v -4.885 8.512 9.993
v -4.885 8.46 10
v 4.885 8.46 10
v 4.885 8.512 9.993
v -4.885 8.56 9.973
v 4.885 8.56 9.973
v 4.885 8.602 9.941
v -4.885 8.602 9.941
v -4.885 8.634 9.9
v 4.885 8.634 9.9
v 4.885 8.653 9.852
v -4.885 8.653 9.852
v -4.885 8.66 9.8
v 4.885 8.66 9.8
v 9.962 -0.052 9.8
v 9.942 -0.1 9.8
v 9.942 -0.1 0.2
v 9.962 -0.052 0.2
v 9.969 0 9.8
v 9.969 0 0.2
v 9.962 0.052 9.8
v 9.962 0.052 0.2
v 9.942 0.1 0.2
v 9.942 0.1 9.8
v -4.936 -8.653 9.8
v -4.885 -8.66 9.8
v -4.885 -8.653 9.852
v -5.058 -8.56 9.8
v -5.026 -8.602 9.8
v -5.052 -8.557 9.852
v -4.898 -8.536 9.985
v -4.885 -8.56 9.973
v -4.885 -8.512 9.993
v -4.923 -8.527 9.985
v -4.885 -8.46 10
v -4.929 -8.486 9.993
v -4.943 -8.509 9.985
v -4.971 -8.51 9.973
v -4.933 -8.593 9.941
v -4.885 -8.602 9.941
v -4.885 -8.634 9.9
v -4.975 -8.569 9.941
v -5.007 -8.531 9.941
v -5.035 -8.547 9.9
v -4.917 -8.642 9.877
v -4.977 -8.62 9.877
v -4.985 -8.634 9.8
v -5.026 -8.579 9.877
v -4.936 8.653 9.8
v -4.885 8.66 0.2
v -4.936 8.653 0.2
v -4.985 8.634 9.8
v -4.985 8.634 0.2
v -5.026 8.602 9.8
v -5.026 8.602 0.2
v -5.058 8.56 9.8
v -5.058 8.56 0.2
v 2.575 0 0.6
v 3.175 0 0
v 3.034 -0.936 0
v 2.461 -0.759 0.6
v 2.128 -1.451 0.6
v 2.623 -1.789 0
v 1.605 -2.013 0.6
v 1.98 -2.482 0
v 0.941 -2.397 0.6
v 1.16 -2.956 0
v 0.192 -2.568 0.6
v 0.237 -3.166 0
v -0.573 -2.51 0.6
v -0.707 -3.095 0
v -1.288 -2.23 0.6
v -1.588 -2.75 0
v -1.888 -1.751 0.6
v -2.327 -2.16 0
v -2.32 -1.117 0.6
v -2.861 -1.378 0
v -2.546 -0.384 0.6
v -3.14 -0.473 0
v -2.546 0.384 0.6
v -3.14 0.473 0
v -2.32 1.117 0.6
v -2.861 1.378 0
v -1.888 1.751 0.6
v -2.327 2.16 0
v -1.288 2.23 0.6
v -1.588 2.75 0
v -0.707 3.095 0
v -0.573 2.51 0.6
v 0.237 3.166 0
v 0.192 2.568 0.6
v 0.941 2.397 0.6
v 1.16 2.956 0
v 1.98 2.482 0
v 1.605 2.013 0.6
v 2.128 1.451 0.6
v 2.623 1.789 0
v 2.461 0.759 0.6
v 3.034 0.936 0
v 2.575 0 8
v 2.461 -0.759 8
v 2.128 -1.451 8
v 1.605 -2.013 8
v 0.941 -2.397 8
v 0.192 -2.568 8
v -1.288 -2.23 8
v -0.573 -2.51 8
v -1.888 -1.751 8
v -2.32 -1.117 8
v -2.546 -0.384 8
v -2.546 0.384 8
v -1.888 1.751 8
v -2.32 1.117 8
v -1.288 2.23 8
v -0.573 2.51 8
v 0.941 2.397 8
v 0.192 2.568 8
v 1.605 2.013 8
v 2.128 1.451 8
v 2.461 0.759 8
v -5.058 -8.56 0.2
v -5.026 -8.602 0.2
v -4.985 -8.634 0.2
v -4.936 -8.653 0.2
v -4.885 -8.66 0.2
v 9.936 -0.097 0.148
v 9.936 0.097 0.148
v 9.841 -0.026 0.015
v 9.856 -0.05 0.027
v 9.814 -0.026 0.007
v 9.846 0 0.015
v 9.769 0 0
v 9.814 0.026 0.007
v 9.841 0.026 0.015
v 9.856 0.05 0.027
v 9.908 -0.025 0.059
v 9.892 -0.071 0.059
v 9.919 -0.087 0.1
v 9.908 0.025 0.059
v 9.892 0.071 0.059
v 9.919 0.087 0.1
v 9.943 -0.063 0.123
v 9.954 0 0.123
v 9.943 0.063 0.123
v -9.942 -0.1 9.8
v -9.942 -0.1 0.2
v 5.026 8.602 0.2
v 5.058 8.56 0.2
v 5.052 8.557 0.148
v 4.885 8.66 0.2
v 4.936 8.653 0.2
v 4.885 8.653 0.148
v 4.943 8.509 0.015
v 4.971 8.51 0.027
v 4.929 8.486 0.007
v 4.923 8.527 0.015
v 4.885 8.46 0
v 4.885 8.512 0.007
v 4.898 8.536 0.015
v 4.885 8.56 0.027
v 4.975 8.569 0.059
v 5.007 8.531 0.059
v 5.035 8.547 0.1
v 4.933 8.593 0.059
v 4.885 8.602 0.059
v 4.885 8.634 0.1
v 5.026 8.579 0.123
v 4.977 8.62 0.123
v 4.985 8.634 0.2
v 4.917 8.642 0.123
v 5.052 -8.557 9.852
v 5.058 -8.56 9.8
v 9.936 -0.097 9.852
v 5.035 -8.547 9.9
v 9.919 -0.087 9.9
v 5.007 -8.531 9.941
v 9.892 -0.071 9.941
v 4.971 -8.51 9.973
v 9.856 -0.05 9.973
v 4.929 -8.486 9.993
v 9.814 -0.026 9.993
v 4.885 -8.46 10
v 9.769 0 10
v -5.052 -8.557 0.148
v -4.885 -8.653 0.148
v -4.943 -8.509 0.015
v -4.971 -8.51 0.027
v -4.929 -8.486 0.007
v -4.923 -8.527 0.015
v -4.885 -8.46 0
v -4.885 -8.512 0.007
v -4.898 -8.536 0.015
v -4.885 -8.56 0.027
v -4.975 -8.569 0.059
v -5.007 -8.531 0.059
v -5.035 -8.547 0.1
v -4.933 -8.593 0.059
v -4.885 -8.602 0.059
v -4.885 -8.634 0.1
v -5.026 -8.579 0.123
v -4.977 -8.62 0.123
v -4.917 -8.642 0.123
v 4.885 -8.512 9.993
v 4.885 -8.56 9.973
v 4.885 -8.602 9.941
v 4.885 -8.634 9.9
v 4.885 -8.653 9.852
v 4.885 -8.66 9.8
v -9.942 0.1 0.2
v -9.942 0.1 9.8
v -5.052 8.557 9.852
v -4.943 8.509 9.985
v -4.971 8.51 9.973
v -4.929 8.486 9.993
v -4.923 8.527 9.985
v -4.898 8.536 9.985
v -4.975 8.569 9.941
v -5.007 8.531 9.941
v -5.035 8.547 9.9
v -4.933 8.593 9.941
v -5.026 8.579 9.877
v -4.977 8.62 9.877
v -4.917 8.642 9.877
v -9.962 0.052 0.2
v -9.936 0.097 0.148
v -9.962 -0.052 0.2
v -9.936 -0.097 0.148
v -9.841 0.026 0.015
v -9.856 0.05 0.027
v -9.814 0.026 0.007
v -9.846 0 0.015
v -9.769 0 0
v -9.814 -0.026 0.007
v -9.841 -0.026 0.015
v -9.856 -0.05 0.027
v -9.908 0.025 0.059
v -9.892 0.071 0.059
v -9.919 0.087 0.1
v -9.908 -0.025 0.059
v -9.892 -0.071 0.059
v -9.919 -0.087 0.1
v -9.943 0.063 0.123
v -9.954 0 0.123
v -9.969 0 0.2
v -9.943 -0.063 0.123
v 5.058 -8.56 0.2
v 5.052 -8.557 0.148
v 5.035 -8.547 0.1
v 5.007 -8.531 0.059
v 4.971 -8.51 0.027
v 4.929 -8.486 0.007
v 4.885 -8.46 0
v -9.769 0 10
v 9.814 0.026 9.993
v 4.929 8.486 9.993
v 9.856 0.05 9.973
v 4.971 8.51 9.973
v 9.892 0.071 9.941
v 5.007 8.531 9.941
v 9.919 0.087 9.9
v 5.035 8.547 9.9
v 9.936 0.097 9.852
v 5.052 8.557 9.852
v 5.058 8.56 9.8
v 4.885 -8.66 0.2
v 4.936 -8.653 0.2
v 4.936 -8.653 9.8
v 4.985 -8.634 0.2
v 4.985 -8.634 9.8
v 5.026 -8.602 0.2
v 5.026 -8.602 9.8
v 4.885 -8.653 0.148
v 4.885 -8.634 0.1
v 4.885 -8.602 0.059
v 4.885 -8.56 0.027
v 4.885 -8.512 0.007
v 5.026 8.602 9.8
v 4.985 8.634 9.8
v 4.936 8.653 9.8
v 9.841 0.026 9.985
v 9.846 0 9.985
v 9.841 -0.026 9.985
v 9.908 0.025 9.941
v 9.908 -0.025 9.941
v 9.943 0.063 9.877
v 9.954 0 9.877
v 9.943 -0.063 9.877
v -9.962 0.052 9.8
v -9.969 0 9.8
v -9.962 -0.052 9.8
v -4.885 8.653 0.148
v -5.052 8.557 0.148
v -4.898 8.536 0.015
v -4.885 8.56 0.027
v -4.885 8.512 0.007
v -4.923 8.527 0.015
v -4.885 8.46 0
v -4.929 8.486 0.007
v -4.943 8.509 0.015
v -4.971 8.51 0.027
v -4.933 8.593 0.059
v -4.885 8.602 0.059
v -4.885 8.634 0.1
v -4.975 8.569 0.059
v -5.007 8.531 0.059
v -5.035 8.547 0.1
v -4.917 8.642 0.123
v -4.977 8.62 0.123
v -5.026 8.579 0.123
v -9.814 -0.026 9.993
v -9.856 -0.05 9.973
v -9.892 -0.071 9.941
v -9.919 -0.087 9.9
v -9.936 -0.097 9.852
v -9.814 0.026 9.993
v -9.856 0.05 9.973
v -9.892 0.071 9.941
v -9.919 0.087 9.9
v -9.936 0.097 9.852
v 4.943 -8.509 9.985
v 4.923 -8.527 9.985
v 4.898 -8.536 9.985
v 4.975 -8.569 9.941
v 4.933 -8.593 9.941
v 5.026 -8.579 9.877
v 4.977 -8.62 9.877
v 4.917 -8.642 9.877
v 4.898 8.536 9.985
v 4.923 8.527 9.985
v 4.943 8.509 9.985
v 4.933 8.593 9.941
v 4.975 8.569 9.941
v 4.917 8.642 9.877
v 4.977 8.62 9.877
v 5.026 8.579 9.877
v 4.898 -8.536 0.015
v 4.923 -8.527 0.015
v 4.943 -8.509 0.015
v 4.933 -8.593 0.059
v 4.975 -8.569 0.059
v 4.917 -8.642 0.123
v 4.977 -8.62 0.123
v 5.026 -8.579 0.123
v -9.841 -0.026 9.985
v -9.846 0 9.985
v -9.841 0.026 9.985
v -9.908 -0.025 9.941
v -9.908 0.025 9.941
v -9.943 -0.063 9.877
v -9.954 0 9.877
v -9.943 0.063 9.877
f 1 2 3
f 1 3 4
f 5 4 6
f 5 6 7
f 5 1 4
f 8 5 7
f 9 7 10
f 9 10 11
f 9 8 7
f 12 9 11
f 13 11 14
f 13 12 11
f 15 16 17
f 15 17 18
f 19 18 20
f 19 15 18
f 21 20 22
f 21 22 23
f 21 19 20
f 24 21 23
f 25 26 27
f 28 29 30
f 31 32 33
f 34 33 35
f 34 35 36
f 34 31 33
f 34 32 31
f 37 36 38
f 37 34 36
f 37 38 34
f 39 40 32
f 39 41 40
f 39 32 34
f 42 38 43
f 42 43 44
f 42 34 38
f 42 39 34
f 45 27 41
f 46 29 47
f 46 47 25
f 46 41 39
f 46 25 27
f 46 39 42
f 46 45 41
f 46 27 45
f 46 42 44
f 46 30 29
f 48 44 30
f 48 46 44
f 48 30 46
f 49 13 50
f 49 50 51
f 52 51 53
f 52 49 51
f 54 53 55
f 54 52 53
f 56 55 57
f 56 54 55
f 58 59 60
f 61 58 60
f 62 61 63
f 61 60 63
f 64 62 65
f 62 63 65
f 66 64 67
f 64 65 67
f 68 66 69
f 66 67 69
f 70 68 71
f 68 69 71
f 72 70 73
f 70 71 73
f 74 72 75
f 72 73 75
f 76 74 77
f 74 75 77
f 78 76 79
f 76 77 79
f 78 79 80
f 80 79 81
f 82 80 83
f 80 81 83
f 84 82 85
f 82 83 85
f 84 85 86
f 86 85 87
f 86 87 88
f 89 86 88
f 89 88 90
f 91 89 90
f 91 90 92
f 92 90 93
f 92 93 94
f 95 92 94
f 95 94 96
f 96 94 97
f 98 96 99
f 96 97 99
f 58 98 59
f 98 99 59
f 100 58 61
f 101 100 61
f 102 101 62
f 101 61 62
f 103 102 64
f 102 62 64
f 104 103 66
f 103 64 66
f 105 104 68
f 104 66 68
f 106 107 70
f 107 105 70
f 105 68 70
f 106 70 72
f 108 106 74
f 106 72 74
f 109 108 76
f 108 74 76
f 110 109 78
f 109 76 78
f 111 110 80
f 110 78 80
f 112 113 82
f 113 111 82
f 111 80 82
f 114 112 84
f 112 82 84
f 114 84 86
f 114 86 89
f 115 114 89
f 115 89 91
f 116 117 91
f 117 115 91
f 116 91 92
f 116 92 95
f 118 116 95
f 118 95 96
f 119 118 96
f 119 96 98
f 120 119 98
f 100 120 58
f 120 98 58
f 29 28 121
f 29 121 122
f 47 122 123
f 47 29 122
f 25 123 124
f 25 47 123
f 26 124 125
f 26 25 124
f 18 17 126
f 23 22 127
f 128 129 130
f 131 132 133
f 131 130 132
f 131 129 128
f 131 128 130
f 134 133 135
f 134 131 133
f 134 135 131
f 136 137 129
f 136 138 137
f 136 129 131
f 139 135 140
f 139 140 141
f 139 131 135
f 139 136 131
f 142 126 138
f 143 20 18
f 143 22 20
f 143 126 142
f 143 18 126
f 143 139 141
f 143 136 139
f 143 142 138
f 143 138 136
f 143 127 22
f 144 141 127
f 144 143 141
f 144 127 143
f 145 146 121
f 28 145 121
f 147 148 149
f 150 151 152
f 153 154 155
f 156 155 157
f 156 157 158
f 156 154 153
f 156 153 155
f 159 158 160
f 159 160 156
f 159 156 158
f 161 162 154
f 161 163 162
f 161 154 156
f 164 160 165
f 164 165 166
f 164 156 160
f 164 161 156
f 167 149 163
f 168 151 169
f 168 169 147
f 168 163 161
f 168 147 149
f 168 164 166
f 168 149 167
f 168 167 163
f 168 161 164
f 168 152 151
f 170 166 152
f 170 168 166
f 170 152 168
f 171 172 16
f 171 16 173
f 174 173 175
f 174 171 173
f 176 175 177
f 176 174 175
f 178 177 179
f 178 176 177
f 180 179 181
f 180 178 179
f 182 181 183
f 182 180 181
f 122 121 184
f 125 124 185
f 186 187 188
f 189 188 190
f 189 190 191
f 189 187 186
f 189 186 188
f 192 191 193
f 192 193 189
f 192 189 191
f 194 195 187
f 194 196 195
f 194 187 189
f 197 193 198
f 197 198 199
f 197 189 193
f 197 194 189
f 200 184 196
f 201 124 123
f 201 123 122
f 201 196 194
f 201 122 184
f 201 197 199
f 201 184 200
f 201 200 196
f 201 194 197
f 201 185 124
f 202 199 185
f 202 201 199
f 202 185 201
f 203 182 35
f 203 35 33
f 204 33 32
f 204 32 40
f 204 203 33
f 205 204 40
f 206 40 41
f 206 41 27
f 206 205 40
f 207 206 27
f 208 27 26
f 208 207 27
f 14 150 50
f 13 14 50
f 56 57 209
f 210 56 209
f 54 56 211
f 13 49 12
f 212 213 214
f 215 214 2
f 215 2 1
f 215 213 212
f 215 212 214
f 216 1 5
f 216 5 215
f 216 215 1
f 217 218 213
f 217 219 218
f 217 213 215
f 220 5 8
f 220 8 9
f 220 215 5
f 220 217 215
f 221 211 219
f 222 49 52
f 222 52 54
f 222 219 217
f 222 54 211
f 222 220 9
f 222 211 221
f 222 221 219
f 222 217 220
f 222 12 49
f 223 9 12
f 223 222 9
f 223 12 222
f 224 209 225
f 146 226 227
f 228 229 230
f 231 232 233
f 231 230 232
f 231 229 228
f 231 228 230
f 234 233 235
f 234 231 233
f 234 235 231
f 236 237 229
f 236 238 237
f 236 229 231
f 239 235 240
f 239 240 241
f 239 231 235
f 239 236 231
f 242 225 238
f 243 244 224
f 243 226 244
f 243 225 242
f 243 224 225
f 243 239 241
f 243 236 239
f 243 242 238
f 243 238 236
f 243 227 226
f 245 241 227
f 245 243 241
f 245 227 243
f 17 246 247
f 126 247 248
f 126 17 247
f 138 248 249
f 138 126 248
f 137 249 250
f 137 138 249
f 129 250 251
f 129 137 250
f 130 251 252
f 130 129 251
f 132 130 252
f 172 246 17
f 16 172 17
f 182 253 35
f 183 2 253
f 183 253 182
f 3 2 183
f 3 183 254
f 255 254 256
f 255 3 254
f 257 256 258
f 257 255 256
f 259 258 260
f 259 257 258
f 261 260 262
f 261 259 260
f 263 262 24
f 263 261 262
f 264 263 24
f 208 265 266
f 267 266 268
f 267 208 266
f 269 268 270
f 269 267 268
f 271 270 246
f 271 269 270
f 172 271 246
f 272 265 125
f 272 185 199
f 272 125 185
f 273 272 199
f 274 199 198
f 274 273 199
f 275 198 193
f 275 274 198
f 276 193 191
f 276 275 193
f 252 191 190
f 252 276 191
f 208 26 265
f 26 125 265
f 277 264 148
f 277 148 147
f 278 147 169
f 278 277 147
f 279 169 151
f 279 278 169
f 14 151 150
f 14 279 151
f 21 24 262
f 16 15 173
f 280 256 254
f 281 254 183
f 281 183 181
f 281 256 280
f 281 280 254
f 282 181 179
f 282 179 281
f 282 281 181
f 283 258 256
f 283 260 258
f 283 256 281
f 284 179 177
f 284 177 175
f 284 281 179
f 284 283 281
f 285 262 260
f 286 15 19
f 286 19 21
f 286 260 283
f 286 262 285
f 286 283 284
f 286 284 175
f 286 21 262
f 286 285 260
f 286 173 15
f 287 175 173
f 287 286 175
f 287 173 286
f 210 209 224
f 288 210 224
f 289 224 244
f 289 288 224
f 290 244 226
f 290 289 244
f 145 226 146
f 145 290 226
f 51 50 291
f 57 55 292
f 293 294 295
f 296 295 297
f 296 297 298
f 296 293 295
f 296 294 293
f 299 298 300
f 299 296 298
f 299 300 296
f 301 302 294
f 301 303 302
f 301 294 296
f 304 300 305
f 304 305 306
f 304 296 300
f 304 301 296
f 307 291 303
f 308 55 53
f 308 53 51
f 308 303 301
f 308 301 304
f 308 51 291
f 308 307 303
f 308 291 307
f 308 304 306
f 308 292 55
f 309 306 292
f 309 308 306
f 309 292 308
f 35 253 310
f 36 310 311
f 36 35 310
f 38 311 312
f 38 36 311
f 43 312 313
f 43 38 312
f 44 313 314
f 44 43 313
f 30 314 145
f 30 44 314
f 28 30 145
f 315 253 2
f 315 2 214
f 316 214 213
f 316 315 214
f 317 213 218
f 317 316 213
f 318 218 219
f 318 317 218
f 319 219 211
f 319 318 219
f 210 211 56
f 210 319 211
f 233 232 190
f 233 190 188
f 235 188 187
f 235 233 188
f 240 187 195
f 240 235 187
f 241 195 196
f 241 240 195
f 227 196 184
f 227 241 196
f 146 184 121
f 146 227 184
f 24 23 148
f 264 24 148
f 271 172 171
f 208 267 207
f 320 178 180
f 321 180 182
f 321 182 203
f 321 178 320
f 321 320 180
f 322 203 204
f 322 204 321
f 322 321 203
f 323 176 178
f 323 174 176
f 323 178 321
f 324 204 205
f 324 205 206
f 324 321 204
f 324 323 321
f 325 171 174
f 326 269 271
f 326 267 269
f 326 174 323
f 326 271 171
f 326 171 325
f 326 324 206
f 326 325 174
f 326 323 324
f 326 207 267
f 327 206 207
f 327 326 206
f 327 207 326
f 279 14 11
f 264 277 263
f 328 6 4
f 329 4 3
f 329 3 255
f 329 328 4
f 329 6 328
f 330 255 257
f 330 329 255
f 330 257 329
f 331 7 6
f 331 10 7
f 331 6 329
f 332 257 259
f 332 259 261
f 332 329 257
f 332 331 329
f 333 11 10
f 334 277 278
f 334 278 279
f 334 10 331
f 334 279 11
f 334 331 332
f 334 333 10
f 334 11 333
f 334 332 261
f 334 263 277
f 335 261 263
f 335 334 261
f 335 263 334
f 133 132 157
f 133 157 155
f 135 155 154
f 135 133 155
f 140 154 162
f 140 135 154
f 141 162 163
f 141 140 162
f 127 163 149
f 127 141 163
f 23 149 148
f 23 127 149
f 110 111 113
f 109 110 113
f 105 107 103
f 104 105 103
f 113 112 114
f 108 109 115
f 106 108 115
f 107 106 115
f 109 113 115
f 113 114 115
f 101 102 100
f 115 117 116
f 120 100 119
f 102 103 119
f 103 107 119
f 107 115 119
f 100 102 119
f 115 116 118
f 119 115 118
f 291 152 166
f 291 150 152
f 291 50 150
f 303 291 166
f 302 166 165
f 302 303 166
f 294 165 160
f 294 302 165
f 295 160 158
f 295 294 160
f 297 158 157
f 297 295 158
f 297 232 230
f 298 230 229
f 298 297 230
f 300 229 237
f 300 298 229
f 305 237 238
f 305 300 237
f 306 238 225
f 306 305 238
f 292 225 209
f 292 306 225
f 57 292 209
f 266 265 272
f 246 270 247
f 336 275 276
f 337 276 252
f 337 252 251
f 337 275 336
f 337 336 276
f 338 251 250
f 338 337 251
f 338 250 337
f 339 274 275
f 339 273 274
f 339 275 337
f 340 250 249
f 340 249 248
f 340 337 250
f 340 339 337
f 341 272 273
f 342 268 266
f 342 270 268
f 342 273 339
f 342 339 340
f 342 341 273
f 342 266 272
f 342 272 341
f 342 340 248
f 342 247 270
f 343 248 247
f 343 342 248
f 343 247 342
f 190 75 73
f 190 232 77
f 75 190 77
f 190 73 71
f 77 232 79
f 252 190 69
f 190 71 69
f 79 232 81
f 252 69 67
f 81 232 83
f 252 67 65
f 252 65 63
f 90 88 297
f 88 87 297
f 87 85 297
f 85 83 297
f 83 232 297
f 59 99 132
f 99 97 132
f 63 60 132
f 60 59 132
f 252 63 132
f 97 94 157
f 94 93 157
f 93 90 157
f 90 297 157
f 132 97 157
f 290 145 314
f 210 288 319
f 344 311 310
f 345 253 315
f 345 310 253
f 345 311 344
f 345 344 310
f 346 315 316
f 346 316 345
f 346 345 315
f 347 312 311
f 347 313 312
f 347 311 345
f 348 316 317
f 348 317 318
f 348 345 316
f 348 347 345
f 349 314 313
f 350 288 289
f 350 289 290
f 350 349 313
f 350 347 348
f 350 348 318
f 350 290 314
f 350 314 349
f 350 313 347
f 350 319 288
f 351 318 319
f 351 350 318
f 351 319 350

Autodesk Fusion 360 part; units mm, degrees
sketch "Sketch1" plane through (0, 0, 0) normal (0, 0, 1) x (1, 0, 0)
  line L0 (8, -8) -> (-8, -8)
  line L1 (-8, -8) -> (-8, 8)
  line L2 (-8, 8) -> (8, 8)
  line L3 (8, 8) -> (8, -8)
  line L4 (8, -8) -> (-8, 8) construction
  line L5 (-8, -8) -> (8, 8) construction
  circle A0 centre (0, 0) radius 2.575
  circle A1 centre (0, 0) radius 3.05
  line L6 (10, 0) -> (5, 8.6603)
  line L7 (5, 8.6603) -> (-5, 8.6603)
  line L8 (-5, 8.6603) -> (-10, 0)
  line L9 (-10, 0) -> (-5, -8.6603)
  line L10 (-5, -8.6603) -> (5, -8.6603)
  line L11 (5, -8.6603) -> (10, 0)
  dimension "d1" = 16
  dimension "d2" = 16
  dimension "d20" = 5.15
  dimension "d23" = 6.1
  dimension "d28" = 10
extrude "Extrude1" add sketch "Sketch1" along normal blind 10 contours L0 L9 L10 L11 | L0 L1 L2 L3 L6 L8 L9 L11 | L3 L6 L11 | L1 L8 L9 | L2 L6 L7 L8 | A0 | A1
fillet "Fillet1" radius 0.2 15 faces at (-2.6667, -1.1547, 10) (-1.6667, -8.6603, 3.3333) (5.1271, -8.4402, 3.3333) (6.2541, -6.488, 3.3333) (8.6667, -2.3094, 3.3333) (-9.3333, -1.1547, 3.3333) (-7.1271, -4.9761, 6.6667) (-5.2541, -8.2201, 3.3333) (-5.1271, 8.4402, 3.3333) (-6.2541, 6.488, 3.3333) (-8.6667, 2.3094, 3.3333) (1.6667, 8.6603, 3.3333) (9.3333, 1.1547, 3.3333) (7.1271, 4.9761, 3.3333) (5.2541, 8.2201, 3.3333)
extrude "Extrude5" cut sketch "Sketch1" along normal blind 8 contours A0
chamfer "Chamfer3" distance 0.6 angle 45 1 edges at (-2.4007, -0.9312, 0)
